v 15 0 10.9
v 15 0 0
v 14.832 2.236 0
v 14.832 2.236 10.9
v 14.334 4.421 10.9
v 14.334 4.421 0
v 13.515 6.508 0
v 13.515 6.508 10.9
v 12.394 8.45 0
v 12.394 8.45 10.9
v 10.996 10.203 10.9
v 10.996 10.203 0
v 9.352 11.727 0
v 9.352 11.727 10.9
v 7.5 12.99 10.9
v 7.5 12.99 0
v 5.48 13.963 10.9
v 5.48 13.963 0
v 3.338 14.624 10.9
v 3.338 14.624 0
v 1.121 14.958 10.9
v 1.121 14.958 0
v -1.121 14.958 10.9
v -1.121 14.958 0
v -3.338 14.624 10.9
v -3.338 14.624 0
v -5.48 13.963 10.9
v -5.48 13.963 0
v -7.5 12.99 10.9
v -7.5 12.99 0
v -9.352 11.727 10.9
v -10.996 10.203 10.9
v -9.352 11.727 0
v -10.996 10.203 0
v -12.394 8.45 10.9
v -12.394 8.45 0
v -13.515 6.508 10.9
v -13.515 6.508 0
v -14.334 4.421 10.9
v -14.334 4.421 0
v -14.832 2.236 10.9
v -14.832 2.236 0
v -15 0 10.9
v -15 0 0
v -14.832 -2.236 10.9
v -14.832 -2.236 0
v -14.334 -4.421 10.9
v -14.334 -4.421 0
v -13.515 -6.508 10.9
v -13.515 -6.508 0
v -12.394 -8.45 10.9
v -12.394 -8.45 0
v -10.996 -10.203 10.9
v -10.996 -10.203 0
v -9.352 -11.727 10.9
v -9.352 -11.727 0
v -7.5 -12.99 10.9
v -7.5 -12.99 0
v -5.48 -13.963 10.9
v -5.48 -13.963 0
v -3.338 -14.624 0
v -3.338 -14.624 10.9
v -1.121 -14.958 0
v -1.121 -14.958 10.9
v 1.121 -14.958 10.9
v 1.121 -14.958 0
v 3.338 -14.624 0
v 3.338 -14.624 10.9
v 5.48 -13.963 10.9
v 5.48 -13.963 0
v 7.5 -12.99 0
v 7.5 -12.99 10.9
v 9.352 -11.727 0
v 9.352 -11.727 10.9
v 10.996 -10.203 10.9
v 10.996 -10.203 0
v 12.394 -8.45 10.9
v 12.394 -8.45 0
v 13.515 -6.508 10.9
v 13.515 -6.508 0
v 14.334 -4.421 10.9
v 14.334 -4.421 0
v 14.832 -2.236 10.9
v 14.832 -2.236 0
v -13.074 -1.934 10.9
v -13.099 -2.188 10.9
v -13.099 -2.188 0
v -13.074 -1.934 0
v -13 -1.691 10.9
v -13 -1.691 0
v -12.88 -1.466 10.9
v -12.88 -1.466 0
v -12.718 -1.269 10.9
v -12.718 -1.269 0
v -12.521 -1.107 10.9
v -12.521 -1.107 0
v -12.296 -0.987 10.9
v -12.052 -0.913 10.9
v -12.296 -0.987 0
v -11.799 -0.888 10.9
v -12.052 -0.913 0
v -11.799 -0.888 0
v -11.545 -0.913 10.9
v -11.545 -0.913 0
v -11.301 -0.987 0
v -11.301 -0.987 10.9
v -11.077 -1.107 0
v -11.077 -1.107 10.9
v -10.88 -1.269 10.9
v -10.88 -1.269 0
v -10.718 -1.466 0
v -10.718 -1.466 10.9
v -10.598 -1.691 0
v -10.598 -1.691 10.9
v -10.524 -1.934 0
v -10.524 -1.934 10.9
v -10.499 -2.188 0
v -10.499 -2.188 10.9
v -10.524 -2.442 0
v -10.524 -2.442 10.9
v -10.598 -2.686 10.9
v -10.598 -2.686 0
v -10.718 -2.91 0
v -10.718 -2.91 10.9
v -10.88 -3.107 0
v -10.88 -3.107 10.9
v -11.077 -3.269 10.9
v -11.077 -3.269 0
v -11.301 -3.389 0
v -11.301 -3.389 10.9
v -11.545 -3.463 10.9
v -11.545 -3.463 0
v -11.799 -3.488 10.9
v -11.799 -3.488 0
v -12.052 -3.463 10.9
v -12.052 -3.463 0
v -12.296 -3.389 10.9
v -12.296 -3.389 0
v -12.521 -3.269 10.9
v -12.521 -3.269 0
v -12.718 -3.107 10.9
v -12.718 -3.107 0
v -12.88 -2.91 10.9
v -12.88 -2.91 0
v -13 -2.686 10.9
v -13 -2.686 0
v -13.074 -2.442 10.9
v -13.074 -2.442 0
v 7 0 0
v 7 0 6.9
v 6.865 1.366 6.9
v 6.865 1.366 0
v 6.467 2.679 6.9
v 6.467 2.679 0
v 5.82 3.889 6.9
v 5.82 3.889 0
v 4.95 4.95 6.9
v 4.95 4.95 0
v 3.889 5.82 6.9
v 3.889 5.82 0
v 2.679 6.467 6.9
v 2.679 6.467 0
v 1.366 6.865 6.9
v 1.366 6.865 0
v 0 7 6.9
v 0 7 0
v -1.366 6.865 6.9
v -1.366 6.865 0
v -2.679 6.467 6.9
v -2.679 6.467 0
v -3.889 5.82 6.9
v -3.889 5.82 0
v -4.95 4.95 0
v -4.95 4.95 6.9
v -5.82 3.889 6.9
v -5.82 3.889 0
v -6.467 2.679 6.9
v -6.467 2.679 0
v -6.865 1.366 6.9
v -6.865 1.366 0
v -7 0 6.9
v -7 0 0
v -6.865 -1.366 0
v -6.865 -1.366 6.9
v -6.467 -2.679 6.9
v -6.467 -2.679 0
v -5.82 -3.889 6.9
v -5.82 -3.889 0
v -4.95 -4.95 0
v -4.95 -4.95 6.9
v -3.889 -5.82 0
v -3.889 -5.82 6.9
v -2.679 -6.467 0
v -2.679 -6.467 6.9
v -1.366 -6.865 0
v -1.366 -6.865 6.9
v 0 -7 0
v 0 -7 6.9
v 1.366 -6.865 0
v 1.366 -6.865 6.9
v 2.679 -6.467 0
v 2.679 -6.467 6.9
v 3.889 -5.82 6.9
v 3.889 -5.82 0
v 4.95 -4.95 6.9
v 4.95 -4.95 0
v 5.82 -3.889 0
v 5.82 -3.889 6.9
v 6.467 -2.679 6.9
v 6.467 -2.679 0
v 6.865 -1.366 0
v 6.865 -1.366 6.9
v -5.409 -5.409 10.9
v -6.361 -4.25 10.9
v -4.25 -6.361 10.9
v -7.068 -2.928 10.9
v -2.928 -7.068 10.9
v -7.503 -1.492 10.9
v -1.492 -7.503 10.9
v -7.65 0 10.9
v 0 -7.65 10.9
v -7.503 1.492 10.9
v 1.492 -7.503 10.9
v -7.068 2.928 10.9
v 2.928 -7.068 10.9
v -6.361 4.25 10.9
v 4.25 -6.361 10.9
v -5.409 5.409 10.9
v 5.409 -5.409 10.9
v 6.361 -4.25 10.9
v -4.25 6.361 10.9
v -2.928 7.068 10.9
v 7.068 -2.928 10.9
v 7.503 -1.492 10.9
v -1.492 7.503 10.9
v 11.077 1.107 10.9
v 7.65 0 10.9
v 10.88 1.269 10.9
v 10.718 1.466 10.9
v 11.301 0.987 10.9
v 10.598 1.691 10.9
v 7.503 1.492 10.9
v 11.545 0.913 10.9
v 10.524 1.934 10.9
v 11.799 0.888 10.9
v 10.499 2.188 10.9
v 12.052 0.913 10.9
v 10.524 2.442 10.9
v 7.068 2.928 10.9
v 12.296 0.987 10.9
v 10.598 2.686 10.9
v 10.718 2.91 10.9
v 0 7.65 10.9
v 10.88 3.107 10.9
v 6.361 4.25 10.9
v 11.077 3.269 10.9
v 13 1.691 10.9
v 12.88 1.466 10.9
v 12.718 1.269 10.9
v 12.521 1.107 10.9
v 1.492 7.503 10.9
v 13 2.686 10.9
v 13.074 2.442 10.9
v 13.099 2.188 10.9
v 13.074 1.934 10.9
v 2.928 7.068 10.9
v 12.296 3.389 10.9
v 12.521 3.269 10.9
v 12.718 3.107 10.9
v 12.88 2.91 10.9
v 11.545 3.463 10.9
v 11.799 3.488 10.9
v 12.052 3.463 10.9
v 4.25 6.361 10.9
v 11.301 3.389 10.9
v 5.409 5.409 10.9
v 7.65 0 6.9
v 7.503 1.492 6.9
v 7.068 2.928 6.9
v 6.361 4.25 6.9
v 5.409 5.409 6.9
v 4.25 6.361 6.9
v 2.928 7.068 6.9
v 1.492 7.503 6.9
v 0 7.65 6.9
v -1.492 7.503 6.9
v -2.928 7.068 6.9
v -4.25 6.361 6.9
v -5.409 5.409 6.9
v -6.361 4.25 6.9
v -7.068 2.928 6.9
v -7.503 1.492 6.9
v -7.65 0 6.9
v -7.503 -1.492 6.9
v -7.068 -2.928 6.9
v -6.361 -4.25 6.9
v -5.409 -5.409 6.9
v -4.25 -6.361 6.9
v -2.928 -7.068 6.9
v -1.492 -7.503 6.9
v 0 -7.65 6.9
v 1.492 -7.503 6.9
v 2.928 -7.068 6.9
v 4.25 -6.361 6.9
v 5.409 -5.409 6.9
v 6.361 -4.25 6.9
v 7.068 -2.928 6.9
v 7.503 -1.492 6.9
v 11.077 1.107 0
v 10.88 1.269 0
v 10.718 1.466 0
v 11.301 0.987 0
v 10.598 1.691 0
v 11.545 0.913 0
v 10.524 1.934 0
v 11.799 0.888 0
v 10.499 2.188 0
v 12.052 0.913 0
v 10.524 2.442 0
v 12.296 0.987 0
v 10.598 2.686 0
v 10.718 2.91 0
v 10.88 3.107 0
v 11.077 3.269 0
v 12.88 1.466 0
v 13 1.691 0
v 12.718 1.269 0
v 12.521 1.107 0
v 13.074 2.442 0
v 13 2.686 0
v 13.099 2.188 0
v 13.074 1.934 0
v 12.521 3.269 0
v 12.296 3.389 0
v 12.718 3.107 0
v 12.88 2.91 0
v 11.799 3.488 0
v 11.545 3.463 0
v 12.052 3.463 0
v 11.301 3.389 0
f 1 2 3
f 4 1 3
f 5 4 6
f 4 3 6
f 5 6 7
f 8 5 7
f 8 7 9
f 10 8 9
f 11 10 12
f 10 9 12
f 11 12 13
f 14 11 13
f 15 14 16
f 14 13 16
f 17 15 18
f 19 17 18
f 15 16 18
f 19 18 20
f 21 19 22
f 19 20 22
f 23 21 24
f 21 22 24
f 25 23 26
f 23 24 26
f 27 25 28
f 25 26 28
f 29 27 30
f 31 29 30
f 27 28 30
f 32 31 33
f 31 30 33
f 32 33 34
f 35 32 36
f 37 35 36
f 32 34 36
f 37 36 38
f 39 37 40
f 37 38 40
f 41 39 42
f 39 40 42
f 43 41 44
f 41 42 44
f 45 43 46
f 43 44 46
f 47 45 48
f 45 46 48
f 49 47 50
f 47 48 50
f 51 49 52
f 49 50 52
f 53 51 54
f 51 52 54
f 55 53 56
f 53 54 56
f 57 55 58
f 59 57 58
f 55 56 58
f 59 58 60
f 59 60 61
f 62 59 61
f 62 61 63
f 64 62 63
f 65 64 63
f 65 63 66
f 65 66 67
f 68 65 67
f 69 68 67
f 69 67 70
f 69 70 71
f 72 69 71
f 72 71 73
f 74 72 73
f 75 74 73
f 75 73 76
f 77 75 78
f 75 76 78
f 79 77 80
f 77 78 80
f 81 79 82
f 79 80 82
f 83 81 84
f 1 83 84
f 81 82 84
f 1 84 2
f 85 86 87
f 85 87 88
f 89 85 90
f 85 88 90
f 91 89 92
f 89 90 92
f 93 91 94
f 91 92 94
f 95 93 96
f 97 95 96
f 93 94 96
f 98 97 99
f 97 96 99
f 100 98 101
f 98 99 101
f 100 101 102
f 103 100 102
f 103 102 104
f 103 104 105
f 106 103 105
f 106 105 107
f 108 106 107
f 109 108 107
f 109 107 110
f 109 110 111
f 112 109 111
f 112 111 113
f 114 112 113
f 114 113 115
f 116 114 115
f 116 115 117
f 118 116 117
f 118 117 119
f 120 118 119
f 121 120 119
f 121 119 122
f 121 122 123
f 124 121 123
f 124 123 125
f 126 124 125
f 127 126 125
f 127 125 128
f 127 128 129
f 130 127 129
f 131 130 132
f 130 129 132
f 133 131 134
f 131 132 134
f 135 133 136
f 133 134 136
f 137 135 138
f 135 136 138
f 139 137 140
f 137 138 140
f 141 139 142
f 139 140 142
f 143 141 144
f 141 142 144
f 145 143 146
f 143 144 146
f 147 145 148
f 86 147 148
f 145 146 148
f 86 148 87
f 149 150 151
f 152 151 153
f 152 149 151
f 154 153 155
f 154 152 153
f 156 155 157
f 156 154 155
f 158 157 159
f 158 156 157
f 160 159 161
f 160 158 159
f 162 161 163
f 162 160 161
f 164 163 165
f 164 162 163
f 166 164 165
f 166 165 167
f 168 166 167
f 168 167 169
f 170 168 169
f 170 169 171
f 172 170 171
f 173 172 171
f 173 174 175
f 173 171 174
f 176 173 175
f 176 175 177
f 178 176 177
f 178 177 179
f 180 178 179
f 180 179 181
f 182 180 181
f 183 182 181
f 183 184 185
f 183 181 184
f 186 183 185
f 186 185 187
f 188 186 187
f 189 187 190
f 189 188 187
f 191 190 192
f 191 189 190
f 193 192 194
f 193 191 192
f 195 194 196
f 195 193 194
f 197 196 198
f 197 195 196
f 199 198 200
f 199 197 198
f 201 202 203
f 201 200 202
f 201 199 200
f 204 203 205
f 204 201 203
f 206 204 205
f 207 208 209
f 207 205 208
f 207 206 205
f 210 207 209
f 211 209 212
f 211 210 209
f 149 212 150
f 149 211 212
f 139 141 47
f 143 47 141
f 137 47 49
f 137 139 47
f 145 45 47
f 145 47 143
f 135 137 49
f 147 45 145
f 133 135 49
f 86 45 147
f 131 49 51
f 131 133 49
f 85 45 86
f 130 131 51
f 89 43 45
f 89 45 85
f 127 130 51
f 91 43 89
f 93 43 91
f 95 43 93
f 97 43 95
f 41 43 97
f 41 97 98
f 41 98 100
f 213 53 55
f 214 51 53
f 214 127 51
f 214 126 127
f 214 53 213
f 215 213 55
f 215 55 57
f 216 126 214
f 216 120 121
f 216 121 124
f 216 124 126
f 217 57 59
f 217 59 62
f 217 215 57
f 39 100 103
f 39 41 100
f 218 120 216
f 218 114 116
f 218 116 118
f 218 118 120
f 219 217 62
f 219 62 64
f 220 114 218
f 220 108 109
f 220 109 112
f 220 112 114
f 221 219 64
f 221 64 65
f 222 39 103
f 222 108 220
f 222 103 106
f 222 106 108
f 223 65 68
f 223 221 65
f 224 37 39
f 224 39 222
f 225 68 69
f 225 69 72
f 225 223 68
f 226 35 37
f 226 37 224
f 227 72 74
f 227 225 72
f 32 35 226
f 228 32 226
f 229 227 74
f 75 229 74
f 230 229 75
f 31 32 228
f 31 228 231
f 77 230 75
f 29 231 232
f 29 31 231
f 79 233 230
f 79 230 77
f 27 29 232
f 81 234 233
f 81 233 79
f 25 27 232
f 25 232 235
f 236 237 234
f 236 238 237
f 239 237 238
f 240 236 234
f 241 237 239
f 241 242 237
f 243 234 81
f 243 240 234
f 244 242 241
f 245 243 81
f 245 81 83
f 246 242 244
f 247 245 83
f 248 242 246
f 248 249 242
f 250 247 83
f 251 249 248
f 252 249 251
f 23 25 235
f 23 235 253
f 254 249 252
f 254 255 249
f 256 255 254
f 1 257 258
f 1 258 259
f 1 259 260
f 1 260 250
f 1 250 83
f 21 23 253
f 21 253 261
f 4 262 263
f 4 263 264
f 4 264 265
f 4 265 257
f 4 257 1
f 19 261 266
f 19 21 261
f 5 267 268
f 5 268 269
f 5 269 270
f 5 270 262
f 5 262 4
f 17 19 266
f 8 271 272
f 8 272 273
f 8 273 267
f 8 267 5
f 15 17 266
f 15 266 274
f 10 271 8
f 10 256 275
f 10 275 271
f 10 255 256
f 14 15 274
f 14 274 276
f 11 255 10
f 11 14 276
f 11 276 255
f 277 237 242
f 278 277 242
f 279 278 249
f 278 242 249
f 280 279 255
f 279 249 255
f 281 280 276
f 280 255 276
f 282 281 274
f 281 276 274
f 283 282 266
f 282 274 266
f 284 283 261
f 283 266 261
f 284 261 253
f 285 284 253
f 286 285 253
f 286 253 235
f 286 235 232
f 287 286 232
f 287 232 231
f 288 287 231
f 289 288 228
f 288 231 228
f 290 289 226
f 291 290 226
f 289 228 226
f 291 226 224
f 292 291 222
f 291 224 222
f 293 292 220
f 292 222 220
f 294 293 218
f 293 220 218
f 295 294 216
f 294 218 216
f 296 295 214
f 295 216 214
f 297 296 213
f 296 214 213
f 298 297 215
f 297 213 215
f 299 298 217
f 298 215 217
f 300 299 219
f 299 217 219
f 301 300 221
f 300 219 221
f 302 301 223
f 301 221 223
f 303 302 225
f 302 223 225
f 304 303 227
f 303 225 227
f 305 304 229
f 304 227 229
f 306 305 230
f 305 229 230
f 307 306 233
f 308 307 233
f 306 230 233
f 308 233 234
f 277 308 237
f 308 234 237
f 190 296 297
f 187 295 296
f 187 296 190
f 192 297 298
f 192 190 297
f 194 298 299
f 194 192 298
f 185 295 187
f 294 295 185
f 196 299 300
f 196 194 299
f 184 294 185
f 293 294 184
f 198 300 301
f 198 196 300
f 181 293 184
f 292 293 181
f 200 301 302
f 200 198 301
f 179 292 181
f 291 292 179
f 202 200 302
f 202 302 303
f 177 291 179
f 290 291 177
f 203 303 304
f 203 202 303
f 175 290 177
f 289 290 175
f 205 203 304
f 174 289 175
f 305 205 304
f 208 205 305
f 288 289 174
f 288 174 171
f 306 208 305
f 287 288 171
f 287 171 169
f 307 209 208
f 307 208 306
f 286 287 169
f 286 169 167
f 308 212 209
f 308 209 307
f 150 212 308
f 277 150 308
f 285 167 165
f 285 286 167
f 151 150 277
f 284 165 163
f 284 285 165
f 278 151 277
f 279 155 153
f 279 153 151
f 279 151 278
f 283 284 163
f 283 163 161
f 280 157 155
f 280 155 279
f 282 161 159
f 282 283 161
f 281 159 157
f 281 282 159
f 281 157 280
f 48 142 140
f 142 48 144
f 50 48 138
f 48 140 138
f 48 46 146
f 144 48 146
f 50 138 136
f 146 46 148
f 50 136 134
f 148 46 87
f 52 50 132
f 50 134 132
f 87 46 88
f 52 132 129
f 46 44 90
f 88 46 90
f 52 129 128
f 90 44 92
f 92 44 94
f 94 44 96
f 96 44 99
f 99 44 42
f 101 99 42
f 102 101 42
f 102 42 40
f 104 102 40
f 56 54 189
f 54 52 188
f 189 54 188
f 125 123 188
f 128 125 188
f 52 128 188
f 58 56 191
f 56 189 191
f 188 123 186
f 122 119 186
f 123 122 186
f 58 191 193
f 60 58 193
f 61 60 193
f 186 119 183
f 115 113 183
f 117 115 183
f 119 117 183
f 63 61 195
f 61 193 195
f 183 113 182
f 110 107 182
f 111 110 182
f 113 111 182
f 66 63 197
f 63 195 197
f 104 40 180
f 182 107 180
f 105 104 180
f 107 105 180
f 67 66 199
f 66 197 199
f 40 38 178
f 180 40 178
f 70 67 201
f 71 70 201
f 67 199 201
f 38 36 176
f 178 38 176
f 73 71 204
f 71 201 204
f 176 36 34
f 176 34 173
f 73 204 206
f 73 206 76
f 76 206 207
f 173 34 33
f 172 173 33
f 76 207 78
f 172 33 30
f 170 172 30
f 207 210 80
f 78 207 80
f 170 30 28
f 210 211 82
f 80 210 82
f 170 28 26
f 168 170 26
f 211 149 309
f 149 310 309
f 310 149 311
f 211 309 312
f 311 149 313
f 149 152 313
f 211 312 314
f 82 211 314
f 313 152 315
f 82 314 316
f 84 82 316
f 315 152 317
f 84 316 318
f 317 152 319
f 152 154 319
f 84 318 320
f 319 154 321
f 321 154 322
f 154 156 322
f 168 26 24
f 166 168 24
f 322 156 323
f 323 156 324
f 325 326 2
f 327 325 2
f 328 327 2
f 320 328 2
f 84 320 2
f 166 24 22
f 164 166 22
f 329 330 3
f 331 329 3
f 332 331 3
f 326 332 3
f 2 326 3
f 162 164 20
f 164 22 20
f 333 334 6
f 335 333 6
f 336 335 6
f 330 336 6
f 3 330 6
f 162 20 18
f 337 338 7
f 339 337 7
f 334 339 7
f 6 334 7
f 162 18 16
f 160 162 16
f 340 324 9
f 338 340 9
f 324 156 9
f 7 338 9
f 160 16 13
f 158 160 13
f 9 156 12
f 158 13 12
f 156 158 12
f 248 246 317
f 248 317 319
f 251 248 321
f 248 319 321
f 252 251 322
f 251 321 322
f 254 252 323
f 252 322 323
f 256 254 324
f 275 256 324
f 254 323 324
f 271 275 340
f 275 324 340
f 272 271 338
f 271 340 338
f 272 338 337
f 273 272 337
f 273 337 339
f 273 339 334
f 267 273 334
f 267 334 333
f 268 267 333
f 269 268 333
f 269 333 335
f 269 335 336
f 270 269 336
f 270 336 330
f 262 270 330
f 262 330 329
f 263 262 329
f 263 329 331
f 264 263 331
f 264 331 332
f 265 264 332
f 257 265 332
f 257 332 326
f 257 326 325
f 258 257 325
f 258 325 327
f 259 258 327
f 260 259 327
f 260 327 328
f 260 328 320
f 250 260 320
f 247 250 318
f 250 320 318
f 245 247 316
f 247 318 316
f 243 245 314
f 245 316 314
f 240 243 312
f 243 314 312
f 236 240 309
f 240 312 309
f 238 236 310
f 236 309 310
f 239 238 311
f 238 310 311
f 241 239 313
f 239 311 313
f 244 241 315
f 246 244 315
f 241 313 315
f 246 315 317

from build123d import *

# Parameters (mm, degrees)
SKETCH_1_R          = 15
SKETCH_1_R_2        = 7
EXTRUDE_1_DEPTH     = 10.9
SKETCH_5_R          = 7.65
CUT_EXTRUDE_3_DEPTH = 4
SKETCH_2_R          = 1.3
CUT_EXTRUDE_4_DEPTH = 24.849737944


with BuildPart() as part:
    # ｽｹｯﾁ1 → ﾎﾞｽ - 押し出し1 (new body)
    with BuildSketch(Plane.XY):
        Circle(SKETCH_1_R)
        Circle(SKETCH_1_R_2, mode=Mode.SUBTRACT)
    extrude(amount=EXTRUDE_1_DEPTH)

    # ｽｹｯﾁ5 → ｶｯﾄ - 押し出し3 (cut)
    with BuildSketch(Plane.XY.offset(10.9)):
        Circle(SKETCH_5_R)
    extrude(amount=-CUT_EXTRUDE_3_DEPTH, mode=Mode.SUBTRACT)

    # ｽｹｯﾁ2 → ｶｯﾄ - 押し出し4 (cut, through all)
    with BuildSketch(Plane(origin=(0, 0, 0), x_dir=(-1, 0, 0), z_dir=(0, 0, -1))):
        with Locations((-11.798830207, 2.188059811)):
            Circle(SKETCH_2_R)
        with Locations((11.798830207, -2.188059811)):
            Circle(SKETCH_2_R)
    extrude(amount=-CUT_EXTRUDE_4_DEPTH, mode=Mode.SUBTRACT)


solid = part.part
